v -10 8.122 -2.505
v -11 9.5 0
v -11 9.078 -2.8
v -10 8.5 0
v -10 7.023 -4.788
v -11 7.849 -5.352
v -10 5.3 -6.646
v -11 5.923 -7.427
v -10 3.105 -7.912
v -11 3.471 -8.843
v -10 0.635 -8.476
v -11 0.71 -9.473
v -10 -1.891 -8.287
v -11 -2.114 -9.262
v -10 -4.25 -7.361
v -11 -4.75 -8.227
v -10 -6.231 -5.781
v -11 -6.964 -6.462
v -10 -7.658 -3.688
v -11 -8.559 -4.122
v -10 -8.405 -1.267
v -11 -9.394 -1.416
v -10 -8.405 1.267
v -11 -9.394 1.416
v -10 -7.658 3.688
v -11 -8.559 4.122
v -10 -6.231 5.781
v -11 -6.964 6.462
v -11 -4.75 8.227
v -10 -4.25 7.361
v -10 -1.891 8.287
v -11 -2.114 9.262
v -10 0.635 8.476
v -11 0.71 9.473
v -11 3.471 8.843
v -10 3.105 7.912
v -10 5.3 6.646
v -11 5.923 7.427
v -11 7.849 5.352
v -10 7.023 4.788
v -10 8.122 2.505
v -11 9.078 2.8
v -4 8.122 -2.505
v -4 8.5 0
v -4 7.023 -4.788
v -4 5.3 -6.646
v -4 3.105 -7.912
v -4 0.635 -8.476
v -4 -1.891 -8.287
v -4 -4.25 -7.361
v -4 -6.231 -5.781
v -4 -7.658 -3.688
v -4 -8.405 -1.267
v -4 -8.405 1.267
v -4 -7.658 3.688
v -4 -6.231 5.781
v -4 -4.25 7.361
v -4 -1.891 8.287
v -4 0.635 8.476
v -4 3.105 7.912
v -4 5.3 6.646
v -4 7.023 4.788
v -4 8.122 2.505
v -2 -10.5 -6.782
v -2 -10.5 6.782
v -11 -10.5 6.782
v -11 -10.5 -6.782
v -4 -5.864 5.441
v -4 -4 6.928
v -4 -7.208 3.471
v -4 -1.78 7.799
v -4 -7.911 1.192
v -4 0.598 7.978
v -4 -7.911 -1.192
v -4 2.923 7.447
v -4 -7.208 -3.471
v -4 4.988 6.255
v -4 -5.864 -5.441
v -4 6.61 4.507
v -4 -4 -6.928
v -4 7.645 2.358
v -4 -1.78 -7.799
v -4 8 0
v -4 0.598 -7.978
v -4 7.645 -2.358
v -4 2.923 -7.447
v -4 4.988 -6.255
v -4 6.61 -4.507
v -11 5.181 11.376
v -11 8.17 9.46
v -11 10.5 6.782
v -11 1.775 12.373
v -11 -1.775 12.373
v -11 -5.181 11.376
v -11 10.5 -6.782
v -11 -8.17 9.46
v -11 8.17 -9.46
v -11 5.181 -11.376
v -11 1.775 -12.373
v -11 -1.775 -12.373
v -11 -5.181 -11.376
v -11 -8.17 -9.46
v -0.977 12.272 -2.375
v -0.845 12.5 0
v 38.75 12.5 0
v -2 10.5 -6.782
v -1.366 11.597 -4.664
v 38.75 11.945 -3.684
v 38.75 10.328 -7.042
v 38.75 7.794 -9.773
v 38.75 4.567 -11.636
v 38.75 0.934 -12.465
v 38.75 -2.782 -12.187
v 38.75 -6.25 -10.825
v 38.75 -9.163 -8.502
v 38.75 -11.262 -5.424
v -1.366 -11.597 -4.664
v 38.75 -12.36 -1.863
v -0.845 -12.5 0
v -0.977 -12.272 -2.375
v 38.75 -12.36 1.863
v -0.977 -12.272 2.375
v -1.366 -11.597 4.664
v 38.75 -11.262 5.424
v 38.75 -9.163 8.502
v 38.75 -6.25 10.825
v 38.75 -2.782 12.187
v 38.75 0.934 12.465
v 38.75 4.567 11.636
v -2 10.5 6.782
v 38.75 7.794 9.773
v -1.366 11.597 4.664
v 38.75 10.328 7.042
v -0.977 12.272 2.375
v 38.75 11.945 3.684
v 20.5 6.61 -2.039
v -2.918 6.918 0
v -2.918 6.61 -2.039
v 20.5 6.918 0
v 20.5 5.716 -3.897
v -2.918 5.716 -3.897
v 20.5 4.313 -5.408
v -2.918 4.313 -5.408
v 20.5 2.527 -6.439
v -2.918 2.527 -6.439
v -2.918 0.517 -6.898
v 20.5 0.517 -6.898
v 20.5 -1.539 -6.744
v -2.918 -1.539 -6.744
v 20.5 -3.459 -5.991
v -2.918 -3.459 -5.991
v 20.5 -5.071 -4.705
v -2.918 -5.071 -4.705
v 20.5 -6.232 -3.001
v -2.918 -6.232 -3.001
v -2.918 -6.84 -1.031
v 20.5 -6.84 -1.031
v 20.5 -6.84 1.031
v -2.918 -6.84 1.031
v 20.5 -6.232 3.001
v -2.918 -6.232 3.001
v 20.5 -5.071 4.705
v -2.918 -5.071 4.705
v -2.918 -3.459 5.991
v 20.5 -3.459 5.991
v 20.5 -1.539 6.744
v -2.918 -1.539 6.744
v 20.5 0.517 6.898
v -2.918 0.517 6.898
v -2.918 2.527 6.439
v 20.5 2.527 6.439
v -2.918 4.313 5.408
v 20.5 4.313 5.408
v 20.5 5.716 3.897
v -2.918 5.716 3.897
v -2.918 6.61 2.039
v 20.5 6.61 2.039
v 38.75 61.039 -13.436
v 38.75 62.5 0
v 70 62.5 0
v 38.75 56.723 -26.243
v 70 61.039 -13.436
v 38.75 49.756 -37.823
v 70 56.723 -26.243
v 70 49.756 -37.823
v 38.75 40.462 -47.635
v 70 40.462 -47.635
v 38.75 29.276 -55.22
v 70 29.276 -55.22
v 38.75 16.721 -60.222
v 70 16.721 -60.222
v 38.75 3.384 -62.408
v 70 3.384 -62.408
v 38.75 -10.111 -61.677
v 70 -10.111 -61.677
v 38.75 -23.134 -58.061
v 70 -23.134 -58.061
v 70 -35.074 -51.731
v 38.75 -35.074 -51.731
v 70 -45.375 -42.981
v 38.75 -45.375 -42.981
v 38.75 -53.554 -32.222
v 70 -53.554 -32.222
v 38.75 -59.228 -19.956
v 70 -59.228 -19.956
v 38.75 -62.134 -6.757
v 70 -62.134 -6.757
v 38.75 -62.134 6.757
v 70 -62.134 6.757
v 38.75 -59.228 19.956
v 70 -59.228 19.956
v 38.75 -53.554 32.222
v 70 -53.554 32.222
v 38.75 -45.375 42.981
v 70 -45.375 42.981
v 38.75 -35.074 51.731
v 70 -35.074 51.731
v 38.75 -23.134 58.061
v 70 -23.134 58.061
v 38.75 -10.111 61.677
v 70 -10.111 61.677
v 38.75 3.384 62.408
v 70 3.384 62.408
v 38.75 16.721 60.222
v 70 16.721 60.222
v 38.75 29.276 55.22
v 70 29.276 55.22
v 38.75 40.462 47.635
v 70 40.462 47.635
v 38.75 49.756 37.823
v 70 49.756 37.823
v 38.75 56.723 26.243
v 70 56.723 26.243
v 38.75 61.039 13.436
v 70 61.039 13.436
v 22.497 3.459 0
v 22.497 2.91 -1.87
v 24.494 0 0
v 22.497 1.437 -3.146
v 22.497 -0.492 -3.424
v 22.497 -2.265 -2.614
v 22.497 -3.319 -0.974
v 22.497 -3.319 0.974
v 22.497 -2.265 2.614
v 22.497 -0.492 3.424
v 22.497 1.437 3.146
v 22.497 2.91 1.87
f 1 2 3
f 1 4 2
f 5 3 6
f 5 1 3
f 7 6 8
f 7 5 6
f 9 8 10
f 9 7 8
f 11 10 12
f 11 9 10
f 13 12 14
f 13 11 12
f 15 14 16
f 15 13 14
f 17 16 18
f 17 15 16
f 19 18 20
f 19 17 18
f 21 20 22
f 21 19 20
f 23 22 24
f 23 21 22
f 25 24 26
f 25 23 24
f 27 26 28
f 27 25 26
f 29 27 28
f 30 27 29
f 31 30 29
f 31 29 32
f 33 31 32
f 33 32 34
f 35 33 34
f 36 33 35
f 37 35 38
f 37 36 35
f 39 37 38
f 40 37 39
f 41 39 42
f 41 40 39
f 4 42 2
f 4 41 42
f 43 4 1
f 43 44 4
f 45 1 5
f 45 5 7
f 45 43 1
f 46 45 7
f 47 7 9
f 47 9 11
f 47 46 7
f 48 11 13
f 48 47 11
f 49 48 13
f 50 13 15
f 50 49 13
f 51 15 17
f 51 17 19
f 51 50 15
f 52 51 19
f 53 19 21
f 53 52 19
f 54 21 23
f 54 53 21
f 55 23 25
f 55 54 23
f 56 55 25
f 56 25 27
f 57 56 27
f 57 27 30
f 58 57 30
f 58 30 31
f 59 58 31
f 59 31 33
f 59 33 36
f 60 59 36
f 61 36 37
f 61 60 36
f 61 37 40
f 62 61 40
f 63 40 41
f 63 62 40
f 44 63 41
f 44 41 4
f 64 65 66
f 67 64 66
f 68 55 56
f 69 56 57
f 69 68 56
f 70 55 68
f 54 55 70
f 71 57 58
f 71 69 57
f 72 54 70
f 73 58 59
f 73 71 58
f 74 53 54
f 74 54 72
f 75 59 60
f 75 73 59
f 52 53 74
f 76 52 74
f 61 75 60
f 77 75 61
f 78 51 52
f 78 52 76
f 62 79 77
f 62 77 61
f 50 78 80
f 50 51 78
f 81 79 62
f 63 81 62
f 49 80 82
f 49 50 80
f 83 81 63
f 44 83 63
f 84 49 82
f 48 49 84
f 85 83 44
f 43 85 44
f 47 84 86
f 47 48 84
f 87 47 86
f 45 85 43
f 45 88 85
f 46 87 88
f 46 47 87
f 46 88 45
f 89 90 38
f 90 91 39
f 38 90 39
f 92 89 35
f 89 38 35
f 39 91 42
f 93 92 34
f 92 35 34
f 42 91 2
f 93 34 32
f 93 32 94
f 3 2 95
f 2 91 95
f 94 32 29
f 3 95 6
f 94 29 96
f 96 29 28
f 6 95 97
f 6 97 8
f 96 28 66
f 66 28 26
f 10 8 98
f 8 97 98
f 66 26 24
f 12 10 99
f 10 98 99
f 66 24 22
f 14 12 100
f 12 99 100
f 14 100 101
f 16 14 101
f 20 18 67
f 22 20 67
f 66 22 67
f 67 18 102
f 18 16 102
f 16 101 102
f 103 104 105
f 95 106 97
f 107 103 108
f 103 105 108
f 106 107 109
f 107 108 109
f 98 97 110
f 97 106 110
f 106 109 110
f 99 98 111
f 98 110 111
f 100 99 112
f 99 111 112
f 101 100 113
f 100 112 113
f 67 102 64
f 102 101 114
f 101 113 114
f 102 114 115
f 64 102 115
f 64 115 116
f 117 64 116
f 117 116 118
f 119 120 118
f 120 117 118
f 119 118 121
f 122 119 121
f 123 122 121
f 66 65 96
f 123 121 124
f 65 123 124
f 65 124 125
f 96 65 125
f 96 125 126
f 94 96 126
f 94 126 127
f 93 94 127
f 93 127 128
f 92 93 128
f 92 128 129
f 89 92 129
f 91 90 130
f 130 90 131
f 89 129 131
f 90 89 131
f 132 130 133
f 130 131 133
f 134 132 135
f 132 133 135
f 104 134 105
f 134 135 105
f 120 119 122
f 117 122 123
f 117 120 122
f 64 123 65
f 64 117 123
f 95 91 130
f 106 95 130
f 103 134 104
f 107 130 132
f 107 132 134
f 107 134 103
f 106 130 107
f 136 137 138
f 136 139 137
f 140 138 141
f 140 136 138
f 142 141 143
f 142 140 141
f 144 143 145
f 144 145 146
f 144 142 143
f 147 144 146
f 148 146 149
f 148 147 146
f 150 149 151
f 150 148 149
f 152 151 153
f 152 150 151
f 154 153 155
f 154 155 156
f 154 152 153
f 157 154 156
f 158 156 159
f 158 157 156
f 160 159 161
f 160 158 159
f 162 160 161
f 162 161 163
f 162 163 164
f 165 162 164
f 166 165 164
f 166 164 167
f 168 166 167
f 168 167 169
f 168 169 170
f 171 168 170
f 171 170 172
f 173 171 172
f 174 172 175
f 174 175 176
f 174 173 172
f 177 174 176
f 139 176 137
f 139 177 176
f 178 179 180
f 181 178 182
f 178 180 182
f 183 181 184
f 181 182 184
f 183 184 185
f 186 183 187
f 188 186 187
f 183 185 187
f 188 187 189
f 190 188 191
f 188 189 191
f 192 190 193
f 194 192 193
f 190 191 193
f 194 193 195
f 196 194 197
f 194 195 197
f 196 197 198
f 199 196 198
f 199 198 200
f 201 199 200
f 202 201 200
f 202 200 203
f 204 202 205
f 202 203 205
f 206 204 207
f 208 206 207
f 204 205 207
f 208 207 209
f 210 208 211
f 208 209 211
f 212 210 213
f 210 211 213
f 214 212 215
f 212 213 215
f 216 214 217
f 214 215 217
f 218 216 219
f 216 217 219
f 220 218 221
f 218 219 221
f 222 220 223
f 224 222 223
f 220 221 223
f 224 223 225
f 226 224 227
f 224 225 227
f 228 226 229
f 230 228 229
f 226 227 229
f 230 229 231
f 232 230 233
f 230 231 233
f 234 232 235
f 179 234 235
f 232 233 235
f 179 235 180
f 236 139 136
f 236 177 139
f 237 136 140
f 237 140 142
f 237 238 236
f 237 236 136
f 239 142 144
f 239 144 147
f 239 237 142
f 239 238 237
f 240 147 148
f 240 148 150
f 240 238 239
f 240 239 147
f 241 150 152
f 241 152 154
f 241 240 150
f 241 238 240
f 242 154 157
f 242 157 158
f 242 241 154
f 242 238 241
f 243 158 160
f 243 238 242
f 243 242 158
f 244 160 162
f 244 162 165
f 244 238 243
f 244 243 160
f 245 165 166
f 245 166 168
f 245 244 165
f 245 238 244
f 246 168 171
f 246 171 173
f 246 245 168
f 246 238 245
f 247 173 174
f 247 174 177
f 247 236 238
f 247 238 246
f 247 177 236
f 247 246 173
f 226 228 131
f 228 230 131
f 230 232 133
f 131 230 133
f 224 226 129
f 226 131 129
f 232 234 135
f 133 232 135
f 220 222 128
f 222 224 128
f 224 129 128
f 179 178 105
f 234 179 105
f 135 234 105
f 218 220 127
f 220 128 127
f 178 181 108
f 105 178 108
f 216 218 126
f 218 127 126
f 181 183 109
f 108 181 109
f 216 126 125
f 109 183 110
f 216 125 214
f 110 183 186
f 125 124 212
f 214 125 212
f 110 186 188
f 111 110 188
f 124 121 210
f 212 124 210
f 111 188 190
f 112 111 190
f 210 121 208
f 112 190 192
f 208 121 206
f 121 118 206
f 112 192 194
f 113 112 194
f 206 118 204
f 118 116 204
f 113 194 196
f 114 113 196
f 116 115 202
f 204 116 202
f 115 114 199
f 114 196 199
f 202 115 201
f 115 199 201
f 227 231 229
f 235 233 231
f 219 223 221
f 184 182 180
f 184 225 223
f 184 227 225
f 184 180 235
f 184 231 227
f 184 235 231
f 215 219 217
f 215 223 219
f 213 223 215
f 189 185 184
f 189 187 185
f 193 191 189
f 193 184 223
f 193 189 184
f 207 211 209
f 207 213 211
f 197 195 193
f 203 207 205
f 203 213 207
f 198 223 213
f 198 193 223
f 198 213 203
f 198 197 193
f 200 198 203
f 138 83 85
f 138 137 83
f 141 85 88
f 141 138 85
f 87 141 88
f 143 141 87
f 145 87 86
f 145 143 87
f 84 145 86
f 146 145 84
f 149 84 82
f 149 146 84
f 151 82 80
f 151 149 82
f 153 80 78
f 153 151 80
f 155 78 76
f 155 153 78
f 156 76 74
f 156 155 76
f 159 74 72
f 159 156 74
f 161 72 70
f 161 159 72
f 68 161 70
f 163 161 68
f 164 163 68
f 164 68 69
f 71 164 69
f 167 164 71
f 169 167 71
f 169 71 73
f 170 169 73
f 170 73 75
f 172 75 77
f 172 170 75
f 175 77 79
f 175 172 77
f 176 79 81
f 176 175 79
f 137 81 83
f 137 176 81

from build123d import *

# Parameters (mm, degrees)
SKETCH1_W               = 81
SKETCH1_H               = 12.5
SKETCH2_W               = 31.25
SKETCH2_H               = 62.5
CUT_EXTRUDE1_DEPTH      = 25
CUT_EXTRUDE1_DEPTH_BACK = 25


with BuildPart() as part:
    # Sketch1 → Revolve1 (revolve)
    with BuildSketch(Plane.XY):
        with Locations((29.5, 6.25)):
            Rectangle(SKETCH1_W, SKETCH1_H)
    revolve(axis=Axis((70, 0, 0), (-1, 0, 0)))

    # Sketch2 → Revolve2 (revolve)
    with BuildSketch(Plane.XY):
        with Locations((54.375, 31.25)):
            Rectangle(SKETCH2_W, SKETCH2_H)
    revolve(axis=Axis((70, 0, 0), (-1, 0, 0)))

    # Sketch3 → Cut-Extrude1 (cut, two sides: drawn at the far end of the back side and taken through both)
    with BuildSketch(Plane.XY.offset(-CUT_EXTRUDE1_DEPTH_BACK)):
        Polygon((-67, -28), (8.103629711, -28), (-2, -10.5), (-11, -10.5), (-11, -15.5), (-56, -15.5), (-56, 15.5), (-11, 15.5), (-11, 10.5), (-2, 10.5), (8.103629711, 28), (-67, 28), align=None)
    extrude(amount=CUT_EXTRUDE1_DEPTH + CUT_EXTRUDE1_DEPTH_BACK, mode=Mode.SUBTRACT)

    # Sketch4 → Cut-Revolve1 (revolve, cut)
    with BuildSketch(Plane.XY):
        Polygon((-11, 0), (-11, 9.5), (-10, 8.5), (-4, 8.5), (-4, 8), (-2.9175, 6.9175), (20.5, 6.9175), (24.493820487, 0), align=None)
    revolve(axis=Axis((24.493820487, 0, 0), (-1, 0, 0)), mode=Mode.SUBTRACT)


solid = part.part
